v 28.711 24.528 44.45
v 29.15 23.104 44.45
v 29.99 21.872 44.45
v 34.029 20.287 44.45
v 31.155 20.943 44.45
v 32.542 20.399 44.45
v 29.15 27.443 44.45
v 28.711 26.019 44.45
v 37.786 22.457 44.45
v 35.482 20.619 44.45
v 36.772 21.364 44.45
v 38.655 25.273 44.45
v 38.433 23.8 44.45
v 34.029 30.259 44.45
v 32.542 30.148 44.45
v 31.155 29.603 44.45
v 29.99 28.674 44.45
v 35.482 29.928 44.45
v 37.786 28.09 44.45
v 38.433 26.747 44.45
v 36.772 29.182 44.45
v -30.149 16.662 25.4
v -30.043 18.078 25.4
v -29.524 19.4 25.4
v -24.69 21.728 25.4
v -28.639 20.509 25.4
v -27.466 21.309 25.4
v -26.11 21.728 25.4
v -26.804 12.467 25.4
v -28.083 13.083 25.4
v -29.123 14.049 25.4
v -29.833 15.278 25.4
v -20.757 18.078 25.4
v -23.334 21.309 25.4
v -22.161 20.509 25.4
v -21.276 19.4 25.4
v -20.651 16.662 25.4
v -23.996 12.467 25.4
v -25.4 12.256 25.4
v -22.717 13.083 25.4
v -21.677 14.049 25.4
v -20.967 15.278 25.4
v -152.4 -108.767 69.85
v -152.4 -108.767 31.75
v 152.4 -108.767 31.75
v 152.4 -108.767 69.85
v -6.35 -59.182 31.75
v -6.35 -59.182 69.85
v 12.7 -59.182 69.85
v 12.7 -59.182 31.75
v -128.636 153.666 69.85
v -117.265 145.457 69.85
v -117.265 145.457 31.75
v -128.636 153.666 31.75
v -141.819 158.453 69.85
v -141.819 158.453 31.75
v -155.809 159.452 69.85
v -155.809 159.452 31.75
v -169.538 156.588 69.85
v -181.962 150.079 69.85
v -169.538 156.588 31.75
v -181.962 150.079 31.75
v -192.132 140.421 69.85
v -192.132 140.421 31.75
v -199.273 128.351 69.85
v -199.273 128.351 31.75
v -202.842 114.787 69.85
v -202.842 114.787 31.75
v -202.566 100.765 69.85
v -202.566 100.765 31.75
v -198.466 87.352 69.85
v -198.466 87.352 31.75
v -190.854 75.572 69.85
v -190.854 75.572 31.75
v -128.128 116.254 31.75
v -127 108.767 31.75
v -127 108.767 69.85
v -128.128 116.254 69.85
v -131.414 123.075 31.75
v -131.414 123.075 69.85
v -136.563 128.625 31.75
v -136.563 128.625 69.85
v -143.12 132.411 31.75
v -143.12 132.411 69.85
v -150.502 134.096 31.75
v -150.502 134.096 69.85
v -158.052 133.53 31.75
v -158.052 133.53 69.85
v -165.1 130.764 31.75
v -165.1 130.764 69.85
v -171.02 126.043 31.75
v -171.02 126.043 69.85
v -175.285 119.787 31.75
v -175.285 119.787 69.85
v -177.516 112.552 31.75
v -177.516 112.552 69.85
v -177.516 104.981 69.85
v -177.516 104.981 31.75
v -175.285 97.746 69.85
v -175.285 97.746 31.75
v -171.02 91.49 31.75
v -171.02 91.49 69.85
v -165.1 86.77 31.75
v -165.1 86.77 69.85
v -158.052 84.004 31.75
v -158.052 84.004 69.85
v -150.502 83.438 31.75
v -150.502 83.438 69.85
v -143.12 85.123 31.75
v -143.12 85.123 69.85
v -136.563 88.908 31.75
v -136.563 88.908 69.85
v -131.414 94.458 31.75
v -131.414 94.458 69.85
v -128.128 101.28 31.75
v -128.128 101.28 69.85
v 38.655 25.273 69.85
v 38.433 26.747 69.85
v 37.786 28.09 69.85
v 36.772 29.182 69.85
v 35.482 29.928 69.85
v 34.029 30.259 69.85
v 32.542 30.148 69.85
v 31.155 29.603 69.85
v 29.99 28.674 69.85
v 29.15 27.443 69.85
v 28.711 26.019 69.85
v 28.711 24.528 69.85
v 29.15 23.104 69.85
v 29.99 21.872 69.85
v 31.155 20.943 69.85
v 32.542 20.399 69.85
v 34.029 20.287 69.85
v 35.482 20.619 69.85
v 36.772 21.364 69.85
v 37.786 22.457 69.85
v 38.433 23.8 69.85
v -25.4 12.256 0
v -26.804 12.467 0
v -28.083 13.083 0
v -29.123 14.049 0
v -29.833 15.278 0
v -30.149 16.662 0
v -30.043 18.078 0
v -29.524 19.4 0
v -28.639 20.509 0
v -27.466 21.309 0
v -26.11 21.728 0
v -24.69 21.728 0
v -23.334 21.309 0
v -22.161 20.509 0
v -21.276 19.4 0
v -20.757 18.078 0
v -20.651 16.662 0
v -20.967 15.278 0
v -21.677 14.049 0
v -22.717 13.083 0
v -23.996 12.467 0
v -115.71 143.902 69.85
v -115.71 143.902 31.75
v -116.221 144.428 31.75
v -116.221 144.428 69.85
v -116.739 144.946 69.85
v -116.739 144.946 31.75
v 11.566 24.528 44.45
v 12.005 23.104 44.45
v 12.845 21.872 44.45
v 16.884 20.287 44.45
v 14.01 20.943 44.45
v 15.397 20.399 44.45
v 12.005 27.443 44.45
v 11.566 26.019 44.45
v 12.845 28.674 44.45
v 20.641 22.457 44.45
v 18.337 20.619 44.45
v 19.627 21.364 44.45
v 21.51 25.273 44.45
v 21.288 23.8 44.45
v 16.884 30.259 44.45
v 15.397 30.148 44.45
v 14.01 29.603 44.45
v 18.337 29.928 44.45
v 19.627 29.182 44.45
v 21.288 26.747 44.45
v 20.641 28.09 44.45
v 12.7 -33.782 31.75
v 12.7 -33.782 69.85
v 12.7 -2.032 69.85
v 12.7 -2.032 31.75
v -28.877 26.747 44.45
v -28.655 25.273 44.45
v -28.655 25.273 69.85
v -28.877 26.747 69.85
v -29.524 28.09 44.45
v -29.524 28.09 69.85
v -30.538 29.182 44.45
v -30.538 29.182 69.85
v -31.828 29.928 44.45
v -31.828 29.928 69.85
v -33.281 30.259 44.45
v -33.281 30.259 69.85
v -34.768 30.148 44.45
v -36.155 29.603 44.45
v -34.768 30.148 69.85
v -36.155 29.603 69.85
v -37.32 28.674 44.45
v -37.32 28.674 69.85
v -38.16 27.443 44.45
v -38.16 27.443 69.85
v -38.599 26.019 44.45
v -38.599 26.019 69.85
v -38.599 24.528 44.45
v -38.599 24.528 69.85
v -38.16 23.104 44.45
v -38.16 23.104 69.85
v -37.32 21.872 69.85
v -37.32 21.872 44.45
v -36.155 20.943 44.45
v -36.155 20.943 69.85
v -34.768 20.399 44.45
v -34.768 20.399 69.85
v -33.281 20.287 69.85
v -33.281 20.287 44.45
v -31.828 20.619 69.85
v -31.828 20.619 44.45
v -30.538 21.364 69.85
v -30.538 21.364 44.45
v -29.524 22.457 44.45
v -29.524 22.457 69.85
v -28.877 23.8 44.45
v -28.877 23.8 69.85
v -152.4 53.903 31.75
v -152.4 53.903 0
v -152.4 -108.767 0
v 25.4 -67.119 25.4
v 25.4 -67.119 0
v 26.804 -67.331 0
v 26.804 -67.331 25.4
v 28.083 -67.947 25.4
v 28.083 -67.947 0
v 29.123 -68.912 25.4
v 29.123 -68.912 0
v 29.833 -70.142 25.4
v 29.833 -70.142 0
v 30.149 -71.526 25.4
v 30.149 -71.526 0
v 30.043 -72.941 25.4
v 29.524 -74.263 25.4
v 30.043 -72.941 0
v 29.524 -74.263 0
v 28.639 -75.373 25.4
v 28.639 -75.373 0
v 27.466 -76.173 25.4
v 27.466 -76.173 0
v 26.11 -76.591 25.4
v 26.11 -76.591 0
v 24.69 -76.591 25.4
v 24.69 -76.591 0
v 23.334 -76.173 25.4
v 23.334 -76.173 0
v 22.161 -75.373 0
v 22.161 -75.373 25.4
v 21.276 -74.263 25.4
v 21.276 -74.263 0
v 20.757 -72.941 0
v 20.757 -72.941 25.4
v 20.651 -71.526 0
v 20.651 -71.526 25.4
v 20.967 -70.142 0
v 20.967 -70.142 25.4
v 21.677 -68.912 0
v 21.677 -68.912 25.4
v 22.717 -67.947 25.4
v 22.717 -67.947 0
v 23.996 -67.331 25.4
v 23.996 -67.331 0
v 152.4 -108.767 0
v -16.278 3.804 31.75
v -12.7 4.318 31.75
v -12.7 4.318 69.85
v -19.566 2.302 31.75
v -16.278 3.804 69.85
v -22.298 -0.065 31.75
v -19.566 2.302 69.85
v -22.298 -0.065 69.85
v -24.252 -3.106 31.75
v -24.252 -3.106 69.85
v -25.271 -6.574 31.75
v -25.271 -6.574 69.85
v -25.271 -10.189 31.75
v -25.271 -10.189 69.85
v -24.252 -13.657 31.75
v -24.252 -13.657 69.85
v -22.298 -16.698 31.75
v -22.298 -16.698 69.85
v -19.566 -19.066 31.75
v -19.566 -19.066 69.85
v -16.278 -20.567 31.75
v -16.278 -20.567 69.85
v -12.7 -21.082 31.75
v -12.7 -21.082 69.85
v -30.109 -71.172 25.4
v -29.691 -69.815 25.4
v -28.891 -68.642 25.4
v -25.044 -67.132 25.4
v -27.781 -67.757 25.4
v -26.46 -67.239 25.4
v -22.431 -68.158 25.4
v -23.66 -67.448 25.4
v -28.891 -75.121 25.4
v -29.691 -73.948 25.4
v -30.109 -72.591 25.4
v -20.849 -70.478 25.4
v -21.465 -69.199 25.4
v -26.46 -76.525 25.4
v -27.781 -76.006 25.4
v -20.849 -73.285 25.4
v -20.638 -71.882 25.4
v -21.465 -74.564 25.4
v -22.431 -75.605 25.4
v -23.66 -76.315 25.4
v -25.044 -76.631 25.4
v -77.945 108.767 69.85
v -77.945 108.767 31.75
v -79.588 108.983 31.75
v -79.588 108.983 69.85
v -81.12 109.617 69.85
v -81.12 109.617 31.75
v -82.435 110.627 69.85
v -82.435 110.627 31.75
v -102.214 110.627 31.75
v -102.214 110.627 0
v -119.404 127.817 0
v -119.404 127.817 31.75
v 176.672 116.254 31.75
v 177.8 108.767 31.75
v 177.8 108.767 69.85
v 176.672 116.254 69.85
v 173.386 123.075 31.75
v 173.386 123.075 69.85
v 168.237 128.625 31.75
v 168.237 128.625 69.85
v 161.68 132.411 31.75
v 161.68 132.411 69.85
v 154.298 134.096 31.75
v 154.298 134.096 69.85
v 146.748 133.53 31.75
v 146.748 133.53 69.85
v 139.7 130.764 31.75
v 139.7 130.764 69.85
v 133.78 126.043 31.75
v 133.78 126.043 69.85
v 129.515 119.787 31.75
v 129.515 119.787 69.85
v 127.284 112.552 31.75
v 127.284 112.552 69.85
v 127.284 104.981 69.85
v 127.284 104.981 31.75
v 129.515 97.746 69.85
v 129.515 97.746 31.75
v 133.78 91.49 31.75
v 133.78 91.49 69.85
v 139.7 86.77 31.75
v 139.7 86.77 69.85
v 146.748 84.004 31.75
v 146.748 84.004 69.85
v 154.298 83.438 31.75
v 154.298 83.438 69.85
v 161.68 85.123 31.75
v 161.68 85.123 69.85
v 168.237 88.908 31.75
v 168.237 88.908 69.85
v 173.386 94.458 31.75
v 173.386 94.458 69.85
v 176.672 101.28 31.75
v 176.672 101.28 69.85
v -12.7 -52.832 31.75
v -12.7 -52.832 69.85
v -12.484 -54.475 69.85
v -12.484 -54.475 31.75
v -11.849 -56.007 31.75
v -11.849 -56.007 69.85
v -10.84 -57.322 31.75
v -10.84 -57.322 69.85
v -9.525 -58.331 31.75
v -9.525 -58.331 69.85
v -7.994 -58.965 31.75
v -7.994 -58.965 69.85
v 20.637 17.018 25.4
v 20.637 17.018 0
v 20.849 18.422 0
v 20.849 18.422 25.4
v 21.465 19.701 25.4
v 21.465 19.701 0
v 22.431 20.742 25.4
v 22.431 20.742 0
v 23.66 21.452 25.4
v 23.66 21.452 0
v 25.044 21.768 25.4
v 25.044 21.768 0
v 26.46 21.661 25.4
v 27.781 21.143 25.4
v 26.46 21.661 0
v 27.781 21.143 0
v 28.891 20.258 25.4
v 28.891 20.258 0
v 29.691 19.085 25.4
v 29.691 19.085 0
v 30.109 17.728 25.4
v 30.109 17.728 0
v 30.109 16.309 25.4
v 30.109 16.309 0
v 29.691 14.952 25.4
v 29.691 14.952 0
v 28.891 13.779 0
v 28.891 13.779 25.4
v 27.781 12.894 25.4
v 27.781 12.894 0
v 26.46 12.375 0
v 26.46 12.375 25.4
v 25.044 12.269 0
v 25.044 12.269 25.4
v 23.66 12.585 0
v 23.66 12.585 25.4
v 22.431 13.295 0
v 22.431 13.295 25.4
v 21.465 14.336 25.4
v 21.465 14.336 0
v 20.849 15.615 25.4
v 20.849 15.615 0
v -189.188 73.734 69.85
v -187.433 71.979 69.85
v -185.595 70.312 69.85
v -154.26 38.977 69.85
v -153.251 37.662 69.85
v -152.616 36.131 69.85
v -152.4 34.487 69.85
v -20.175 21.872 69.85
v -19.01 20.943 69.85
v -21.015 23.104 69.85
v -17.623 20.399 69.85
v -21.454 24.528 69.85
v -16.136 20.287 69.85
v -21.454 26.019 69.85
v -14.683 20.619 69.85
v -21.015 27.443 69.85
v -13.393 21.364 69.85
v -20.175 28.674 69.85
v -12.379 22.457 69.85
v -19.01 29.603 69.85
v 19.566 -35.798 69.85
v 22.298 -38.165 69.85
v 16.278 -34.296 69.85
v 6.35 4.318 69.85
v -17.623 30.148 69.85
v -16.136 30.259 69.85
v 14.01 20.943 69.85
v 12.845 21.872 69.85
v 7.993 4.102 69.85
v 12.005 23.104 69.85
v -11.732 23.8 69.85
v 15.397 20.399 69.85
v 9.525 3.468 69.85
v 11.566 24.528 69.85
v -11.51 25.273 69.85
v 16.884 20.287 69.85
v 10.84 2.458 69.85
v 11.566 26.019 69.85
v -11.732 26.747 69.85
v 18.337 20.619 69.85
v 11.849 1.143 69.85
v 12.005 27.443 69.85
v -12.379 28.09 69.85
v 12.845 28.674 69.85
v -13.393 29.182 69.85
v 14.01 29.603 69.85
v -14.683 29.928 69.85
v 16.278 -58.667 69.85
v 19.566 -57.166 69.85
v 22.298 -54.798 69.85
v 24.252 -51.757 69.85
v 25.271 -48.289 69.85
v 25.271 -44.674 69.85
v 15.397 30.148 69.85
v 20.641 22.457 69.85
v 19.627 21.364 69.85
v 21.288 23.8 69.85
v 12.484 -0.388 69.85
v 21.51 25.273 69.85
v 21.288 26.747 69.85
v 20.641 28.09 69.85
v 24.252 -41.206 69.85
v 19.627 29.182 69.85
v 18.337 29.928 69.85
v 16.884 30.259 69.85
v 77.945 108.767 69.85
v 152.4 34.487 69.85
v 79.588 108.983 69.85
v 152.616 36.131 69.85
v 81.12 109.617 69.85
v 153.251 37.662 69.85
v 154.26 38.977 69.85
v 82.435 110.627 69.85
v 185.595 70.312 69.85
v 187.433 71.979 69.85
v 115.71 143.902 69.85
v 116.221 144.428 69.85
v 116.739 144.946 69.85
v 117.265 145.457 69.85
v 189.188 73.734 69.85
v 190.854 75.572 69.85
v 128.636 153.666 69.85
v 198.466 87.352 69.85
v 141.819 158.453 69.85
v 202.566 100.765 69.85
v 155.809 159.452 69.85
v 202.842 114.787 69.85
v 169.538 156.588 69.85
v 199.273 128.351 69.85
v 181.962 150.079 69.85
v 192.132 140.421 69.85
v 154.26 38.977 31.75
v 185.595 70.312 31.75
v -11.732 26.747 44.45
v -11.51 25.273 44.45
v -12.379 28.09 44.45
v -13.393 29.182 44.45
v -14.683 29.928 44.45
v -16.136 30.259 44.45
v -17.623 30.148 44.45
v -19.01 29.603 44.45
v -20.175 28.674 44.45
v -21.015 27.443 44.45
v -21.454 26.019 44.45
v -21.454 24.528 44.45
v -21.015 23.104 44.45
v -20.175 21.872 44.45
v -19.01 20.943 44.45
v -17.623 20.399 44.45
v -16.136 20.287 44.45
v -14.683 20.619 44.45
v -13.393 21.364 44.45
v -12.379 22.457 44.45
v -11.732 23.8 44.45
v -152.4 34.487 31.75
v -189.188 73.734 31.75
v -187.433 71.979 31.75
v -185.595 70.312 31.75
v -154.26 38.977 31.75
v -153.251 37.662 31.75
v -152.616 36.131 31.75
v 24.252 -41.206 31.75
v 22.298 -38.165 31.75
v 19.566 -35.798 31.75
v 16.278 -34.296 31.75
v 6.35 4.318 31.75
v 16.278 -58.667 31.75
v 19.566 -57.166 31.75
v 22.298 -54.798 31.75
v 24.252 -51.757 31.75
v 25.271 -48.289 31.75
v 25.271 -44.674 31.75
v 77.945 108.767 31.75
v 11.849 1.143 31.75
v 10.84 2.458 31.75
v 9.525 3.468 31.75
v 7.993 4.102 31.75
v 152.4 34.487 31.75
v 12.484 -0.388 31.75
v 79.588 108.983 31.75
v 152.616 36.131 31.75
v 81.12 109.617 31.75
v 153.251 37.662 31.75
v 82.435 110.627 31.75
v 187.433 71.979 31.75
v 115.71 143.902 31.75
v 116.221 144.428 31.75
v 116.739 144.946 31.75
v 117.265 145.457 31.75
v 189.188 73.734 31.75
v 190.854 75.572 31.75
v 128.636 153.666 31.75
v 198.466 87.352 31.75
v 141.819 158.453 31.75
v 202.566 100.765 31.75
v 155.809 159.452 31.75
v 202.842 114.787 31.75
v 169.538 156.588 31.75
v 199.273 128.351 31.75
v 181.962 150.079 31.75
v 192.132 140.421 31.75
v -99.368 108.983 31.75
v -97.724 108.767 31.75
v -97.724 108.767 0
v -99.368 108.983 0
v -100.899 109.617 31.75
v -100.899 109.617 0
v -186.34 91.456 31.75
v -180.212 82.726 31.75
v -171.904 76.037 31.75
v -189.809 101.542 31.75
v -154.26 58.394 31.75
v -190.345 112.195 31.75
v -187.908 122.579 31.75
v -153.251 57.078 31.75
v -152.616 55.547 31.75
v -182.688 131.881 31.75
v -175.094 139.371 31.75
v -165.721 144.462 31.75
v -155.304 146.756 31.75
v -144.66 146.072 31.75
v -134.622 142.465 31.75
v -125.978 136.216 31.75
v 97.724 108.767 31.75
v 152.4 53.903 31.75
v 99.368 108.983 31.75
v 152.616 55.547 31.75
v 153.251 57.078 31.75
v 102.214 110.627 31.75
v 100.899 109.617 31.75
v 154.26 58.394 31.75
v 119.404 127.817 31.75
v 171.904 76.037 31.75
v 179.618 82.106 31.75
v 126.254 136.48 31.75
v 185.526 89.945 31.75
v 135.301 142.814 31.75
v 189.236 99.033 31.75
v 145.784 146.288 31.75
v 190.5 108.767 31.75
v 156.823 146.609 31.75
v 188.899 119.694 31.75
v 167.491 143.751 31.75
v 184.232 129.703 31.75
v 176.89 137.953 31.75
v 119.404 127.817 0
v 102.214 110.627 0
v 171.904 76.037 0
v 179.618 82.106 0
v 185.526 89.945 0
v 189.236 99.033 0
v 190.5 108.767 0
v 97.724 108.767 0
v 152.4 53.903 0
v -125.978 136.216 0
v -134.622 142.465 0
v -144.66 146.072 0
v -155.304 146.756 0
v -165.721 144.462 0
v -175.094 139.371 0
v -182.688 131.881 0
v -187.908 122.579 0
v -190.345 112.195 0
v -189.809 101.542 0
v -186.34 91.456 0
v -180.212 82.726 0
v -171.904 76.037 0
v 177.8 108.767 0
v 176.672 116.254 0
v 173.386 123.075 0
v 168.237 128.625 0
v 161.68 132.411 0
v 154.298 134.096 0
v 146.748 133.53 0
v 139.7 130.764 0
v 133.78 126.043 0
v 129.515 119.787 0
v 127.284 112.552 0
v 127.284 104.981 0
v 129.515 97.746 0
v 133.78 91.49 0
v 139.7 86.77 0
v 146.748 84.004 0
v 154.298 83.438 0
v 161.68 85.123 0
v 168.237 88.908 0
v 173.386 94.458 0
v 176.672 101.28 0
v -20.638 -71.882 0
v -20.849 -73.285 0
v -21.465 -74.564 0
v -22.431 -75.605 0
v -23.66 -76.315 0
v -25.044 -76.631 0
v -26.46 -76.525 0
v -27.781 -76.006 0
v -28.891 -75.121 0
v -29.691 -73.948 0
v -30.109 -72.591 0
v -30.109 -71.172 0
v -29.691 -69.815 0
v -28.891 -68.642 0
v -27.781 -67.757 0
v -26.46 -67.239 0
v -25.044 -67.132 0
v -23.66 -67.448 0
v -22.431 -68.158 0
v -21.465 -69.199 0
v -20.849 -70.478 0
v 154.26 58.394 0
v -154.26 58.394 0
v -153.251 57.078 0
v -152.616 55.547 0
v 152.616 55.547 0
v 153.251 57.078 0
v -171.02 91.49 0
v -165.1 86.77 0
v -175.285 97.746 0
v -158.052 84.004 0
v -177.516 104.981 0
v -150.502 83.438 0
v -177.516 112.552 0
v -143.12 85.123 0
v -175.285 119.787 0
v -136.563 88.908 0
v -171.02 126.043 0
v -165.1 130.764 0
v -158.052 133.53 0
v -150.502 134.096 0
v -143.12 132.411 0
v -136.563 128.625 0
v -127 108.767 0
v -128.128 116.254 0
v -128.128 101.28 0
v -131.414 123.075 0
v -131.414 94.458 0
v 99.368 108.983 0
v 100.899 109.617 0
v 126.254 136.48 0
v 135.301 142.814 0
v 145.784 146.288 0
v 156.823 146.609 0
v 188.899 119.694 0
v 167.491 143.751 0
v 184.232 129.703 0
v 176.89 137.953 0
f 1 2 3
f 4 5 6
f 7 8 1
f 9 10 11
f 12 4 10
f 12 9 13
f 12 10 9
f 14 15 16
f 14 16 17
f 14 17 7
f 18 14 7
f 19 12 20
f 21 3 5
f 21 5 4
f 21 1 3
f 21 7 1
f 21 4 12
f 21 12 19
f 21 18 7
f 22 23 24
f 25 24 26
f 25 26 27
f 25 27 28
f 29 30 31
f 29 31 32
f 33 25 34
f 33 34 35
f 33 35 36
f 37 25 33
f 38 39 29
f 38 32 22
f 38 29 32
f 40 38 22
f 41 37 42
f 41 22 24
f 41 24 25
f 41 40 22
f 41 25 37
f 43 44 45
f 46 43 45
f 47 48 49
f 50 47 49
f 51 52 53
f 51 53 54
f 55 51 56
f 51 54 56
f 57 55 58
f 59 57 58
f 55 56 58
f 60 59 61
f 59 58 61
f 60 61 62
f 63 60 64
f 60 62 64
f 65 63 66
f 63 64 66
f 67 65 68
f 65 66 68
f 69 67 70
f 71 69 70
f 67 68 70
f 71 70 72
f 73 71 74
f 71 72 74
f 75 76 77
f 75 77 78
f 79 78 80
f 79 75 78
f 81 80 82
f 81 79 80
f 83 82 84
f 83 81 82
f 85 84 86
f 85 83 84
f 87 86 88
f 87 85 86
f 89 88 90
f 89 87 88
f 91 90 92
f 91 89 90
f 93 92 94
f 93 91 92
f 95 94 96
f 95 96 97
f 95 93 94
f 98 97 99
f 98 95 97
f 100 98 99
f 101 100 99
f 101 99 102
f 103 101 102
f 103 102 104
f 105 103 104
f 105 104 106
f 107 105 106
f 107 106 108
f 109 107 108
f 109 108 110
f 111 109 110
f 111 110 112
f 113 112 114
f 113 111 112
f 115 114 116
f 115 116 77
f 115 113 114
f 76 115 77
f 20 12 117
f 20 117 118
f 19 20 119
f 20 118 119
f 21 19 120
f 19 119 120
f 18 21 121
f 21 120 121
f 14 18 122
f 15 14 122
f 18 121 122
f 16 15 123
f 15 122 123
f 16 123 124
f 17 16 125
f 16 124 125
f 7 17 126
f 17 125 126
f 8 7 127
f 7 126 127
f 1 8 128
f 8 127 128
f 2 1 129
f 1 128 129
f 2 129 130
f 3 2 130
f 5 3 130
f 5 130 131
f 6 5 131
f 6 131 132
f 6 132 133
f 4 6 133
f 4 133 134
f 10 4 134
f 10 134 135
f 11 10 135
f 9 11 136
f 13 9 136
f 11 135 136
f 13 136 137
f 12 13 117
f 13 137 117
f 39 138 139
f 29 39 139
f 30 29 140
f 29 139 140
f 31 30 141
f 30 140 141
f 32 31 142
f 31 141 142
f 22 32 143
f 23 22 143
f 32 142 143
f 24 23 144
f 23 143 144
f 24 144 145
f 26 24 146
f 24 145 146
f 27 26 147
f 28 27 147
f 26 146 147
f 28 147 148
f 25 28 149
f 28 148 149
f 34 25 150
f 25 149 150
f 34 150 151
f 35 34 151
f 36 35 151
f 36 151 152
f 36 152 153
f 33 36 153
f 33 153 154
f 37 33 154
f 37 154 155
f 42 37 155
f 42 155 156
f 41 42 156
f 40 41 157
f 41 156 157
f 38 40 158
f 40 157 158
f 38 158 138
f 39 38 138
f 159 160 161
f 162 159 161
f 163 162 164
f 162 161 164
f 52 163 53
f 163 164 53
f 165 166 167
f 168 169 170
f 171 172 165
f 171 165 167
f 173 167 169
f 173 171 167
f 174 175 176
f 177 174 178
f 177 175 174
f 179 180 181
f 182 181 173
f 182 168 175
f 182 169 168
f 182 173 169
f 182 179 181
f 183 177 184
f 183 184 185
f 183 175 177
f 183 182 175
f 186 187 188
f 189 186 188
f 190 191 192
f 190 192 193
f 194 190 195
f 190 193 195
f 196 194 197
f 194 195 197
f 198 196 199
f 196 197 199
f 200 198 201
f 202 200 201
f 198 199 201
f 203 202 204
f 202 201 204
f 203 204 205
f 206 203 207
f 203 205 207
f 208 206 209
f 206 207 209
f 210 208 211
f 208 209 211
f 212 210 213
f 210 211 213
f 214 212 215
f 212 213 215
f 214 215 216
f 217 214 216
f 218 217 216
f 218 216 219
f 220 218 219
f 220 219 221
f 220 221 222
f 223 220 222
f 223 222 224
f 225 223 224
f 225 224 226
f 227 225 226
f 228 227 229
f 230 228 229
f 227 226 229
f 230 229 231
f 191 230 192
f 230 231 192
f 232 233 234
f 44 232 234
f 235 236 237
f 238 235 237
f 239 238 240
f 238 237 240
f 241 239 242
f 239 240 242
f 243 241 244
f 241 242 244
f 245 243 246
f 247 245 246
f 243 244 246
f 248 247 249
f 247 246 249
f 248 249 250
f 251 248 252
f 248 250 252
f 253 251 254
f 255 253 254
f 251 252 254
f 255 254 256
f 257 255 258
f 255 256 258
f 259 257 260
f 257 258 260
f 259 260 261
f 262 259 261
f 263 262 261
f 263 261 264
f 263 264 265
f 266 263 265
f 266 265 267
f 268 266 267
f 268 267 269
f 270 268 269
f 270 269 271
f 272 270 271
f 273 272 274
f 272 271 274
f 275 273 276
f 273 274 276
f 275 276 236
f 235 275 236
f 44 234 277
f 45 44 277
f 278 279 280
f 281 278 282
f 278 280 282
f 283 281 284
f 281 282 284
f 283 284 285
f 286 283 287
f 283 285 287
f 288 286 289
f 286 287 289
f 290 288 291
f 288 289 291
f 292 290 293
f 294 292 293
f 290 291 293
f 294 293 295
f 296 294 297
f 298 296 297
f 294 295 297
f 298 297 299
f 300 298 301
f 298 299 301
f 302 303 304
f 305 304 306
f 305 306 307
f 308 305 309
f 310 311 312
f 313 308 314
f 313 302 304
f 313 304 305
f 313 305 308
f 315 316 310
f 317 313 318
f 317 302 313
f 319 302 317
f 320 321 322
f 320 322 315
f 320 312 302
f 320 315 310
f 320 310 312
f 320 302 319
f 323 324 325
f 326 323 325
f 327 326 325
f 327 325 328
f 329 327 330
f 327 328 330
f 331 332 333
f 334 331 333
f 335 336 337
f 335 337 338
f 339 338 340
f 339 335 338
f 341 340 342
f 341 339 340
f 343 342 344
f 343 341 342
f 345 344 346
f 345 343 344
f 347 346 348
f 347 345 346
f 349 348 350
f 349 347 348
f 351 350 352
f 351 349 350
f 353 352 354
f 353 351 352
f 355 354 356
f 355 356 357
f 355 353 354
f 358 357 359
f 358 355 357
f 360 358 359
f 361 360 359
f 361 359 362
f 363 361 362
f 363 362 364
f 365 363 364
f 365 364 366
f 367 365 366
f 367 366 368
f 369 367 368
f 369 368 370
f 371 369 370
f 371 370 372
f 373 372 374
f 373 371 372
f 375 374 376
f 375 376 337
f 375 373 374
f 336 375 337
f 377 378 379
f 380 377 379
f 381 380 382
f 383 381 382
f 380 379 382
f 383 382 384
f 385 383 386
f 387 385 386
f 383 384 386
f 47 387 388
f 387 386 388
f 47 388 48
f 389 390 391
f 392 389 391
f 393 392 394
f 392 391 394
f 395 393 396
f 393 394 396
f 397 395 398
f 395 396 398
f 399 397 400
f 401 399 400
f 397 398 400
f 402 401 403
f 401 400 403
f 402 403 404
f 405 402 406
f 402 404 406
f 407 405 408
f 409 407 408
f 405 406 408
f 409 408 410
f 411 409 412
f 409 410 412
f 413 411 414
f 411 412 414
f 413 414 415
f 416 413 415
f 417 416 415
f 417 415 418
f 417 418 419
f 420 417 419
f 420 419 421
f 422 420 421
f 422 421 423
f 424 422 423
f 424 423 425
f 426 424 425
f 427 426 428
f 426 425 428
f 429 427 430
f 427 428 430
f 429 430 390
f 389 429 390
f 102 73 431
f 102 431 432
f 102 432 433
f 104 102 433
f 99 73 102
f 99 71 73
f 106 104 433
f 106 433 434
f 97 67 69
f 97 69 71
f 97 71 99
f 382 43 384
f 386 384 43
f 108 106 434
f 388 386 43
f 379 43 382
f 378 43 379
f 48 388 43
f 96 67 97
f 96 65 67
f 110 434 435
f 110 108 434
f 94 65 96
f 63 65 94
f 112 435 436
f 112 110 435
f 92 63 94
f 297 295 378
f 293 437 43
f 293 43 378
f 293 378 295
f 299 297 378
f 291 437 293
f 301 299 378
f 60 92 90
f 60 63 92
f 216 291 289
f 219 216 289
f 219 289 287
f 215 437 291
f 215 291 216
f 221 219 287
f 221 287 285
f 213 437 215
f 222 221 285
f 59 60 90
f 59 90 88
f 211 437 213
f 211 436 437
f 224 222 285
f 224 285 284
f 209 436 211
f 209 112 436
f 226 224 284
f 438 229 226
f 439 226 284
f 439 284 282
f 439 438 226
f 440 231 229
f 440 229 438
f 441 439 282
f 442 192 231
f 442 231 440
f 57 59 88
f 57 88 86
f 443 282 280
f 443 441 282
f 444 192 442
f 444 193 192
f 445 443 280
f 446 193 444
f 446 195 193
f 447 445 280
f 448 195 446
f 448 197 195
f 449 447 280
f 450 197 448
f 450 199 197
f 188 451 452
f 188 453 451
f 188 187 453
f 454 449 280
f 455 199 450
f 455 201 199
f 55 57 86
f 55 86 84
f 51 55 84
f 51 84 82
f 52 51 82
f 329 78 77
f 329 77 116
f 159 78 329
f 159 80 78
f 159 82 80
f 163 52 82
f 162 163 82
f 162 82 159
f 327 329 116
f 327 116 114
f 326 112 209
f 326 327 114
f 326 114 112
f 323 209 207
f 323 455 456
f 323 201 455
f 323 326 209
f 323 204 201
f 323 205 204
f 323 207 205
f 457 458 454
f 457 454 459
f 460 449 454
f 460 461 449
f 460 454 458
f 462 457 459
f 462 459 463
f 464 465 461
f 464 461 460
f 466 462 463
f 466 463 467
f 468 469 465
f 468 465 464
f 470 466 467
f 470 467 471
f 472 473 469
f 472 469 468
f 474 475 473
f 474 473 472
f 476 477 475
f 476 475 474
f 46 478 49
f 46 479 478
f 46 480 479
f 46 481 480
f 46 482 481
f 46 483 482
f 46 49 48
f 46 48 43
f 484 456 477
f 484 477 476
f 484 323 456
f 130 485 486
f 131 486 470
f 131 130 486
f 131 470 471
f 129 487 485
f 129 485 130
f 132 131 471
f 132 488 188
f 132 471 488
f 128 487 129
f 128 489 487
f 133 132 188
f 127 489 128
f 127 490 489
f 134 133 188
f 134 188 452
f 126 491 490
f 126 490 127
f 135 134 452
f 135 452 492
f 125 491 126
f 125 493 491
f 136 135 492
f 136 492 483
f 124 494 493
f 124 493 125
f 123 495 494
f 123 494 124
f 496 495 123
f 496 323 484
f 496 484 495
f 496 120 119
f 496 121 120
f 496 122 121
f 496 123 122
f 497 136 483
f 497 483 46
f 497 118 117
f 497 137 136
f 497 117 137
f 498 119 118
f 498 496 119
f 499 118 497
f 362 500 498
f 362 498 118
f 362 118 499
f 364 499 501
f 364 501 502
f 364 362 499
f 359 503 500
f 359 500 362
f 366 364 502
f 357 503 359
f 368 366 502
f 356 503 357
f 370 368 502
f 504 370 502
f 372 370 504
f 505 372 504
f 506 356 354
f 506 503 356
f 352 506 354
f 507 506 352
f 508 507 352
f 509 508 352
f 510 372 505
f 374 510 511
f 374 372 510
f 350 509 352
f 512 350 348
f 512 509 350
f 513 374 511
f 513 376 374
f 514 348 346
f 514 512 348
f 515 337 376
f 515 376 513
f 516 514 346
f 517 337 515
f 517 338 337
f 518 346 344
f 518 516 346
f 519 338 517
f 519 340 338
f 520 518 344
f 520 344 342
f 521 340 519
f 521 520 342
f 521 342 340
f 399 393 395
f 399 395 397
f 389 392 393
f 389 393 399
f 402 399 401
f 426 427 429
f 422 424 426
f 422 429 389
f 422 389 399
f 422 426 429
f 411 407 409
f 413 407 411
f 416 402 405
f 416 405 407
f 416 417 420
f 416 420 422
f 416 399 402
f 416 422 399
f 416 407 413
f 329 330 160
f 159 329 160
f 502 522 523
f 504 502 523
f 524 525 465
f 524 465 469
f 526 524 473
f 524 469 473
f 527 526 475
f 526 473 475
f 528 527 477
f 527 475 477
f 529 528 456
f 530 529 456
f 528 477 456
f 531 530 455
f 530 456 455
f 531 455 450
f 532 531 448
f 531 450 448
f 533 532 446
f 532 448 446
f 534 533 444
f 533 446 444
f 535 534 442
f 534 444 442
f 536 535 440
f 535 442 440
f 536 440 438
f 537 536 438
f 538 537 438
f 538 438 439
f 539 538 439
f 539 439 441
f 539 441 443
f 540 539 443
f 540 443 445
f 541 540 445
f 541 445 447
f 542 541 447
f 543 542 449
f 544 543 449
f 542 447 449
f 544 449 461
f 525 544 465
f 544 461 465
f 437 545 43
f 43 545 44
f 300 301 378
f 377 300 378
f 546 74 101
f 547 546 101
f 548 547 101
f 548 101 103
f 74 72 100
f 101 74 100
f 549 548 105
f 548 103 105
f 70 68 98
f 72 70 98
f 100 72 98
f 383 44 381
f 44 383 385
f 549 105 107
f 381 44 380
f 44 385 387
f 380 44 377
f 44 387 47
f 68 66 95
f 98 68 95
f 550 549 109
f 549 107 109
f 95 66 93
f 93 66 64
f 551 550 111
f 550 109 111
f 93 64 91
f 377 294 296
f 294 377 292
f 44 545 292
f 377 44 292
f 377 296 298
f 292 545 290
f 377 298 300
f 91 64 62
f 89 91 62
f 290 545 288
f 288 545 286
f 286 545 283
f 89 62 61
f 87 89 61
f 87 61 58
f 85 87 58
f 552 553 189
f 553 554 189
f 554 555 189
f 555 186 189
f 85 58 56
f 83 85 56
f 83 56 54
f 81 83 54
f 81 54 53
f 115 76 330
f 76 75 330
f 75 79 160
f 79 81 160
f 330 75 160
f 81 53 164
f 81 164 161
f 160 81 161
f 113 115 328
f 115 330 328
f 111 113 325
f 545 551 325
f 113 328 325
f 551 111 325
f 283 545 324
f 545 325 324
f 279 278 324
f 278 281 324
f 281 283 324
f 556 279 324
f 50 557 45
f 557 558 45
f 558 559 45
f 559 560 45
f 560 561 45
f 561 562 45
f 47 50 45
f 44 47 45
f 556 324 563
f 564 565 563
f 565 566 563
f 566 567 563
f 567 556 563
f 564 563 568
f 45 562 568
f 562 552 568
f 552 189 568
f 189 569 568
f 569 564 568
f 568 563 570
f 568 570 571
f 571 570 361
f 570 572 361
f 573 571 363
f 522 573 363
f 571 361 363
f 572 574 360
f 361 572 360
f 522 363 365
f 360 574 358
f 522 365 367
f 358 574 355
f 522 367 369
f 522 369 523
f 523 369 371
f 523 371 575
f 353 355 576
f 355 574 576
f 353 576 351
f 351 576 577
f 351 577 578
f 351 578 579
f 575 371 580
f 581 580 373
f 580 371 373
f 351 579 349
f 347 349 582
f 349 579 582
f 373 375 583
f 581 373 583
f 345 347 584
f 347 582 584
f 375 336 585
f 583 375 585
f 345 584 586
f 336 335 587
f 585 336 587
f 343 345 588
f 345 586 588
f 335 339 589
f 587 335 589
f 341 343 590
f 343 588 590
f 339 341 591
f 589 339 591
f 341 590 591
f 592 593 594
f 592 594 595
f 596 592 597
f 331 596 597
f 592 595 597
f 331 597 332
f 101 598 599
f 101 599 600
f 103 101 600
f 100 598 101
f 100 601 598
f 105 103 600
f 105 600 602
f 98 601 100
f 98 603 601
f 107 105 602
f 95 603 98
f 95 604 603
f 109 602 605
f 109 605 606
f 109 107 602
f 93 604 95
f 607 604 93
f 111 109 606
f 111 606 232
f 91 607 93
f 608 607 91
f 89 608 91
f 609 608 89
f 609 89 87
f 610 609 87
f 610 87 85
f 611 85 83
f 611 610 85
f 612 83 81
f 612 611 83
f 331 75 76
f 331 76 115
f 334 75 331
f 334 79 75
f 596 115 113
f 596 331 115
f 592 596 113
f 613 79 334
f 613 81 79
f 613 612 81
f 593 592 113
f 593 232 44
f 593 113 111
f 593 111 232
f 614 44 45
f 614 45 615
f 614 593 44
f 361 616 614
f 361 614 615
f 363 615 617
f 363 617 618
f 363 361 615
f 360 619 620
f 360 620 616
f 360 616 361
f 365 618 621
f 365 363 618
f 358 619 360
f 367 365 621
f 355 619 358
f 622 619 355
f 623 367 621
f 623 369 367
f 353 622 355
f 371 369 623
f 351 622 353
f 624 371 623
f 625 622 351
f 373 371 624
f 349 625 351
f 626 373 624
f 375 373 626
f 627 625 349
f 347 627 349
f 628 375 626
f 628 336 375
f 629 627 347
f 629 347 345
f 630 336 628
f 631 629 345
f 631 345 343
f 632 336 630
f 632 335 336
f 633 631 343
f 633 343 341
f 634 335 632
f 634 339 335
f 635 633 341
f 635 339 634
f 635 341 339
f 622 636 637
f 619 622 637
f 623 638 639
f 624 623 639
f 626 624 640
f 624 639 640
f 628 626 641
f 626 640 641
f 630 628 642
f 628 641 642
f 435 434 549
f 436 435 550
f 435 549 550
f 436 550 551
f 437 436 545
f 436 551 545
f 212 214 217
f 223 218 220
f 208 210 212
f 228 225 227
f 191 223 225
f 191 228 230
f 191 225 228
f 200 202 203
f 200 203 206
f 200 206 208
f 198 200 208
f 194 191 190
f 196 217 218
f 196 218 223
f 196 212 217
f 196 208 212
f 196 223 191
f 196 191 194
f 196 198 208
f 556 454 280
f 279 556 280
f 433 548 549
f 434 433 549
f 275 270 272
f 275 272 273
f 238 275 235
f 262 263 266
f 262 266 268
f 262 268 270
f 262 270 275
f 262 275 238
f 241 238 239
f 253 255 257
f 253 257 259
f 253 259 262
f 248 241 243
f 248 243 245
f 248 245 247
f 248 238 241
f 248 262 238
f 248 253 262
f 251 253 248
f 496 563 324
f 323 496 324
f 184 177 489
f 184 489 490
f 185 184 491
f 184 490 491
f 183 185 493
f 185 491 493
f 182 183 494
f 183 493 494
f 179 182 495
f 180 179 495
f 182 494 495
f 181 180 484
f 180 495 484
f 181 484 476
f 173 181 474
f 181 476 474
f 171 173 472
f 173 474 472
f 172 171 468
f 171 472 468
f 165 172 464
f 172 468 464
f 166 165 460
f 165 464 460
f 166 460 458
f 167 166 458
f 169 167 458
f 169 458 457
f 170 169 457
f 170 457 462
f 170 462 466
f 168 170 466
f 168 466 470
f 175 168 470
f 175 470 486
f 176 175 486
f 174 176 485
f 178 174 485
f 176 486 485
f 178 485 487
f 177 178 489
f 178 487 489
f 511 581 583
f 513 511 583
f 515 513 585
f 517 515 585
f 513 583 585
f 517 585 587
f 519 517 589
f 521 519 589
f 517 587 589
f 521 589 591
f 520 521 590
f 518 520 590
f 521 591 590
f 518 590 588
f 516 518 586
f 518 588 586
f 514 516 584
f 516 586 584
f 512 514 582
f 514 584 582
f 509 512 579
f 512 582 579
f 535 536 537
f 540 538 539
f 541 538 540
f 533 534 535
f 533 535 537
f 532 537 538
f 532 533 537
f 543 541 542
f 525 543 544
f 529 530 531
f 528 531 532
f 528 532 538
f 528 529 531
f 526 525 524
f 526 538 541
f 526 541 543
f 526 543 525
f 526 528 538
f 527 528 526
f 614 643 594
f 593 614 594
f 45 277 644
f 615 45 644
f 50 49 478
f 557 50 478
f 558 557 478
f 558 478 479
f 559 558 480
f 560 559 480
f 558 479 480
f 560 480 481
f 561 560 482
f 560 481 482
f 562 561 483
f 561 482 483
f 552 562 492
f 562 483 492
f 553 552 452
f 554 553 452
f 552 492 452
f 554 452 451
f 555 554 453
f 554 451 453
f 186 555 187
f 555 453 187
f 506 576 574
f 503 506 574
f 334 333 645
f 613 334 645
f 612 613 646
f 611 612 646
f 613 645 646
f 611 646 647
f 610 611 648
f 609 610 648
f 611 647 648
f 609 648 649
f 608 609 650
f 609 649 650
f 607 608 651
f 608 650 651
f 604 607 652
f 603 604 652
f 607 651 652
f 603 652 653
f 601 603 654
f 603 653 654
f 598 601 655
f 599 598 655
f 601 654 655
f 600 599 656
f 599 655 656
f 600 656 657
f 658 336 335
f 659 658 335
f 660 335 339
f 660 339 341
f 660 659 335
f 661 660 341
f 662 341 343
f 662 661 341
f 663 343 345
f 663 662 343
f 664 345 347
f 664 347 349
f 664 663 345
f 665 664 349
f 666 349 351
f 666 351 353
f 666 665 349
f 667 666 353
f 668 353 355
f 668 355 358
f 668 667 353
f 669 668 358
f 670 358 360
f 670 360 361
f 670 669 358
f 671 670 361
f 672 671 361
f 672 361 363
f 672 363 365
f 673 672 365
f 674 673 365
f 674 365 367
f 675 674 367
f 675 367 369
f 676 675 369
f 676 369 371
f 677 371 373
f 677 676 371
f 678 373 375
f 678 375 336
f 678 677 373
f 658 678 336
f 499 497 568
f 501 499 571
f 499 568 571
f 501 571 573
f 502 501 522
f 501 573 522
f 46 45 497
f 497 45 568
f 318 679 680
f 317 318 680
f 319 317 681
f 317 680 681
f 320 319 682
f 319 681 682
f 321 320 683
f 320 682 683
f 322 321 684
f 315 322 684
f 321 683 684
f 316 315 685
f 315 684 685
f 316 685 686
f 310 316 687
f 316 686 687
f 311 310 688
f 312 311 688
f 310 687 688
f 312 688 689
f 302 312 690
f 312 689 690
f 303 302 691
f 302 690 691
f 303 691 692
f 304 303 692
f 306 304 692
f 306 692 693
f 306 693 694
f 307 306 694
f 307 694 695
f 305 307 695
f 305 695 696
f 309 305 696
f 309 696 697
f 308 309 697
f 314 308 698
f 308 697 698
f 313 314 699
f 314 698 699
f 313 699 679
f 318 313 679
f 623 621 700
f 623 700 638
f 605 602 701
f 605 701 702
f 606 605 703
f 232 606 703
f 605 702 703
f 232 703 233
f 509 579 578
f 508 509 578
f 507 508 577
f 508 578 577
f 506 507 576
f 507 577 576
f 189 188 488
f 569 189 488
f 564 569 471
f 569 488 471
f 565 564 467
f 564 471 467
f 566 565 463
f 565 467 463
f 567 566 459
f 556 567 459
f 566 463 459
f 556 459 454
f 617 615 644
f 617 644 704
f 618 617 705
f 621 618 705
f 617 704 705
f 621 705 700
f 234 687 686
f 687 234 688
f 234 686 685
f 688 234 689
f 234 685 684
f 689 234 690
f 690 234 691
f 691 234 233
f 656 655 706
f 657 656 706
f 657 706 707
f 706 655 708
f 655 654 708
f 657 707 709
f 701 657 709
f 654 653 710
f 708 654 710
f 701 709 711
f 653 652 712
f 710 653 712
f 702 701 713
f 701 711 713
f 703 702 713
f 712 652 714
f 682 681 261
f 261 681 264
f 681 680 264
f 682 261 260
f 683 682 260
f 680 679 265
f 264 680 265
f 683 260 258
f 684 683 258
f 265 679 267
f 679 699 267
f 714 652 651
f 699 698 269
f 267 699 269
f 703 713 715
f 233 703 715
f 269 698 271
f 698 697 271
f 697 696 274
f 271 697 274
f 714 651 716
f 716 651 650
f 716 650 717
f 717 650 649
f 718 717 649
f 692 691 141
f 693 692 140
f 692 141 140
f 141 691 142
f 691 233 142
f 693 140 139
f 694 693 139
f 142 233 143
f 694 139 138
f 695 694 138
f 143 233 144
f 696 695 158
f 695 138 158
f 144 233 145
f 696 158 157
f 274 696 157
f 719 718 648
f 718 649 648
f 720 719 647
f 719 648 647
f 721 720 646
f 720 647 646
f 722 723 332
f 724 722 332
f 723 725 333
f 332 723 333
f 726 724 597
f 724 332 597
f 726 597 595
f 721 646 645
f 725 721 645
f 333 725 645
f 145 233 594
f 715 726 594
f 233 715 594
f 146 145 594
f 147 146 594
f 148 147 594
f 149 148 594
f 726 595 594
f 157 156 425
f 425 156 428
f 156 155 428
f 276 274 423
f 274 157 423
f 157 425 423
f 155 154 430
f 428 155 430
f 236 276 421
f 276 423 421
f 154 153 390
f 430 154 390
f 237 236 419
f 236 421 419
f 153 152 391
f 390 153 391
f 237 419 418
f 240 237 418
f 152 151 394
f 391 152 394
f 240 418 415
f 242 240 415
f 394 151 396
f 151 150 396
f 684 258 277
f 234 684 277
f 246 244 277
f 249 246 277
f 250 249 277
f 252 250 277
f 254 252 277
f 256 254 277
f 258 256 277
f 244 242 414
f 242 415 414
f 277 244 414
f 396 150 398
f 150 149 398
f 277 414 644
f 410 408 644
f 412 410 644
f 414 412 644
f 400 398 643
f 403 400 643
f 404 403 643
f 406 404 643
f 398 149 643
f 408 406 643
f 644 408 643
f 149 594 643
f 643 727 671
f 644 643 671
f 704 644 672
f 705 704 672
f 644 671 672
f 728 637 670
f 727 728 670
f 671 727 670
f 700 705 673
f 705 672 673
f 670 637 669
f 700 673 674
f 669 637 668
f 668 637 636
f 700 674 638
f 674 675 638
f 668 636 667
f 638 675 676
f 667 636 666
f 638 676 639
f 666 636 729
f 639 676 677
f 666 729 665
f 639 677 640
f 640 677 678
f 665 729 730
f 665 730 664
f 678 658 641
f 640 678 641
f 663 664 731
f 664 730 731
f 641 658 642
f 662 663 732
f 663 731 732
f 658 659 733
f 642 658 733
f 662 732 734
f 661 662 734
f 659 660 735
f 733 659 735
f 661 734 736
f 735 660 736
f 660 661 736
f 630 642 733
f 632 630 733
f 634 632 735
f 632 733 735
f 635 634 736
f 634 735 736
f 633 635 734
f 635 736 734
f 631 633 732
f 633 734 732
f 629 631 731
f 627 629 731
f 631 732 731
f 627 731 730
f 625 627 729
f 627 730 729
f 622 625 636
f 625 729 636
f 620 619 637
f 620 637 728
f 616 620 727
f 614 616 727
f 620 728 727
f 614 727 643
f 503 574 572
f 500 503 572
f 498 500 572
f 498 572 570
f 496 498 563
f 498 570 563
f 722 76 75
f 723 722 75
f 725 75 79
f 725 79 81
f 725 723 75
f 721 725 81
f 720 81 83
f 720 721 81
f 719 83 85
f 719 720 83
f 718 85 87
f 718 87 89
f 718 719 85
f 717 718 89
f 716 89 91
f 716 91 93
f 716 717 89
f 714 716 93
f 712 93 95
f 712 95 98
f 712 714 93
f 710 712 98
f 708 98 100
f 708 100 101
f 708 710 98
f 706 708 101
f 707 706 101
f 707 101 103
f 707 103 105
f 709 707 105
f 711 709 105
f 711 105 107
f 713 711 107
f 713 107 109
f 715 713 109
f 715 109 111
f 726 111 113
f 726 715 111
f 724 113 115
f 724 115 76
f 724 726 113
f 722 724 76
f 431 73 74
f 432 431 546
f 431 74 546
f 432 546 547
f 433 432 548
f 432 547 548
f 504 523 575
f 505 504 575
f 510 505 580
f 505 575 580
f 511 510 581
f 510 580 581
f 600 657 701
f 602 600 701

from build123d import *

# Parameters (mm, degrees)
F0_R      = 25.4
F1_DEPTH  = 31.75
F4_R      = 25.4
F5_DEPTH  = 38.1
F7_DEPTH  = 25.4
F9_R      = 5
F10_DEPTH = 25.4
F12_DEPTH = 38.1


with BuildPart() as f1:
    # F0 (on Top) → F1 (new body)
    with BuildSketch(Plane.XY):
        with BuildLine():
            Line((-152.4, 53.9033839703), (-152.4, -108.7667216295))
            Line((-152.4, -108.7667216295), (152.4, -108.7667216295))
            Line((152.4, -108.7667216295), (152.4, 53.9033839703))
            ThreePointArc((152.4, 53.9033839703), (152.8833649686, 56.3334237658), (154.2598719395, 58.3935120309))
            Line((154.2598719395, 58.3935120309), (171.9035763614, 76.0372164528))
            ThreePointArc((171.9035763614, 76.0372164528), (125.6457900901, 81.6406778321), (119.4044321158, 127.8167216295))
            Line((119.4044321158, 127.8167216295), (102.2143040553, 110.626593569))
            ThreePointArc((102.2143040553, 110.626593569), (100.1542157903, 109.2500865981), (97.7241759947, 108.7667216295))
            Line((97.7241759947, 108.7667216295), (-97.7241759947, 108.7667216295))
            ThreePointArc((-97.7241759947, 108.7667216295), (-100.1542157903, 109.2500865981), (-102.2143040553, 110.626593569))
            Line((-102.2143040553, 110.626593569), (-119.4044321158, 127.8167216295))
            ThreePointArc((-119.4044321158, 127.8167216295), (-115.5982260184, 118.6277272479), (-114.3, 108.7667216295))
            ThreePointArc((-114.3, 108.7667216295), (-125.4592316368, 81.8259532663), (-152.4, 70.6667216295))
            Line((-152.4, 70.6667216295), (-152.4, 53.9033839703))
        make_face()
        with BuildLine():
            ThreePointArc((-171.9035763614, 76.0372164528), (-162.5147380778, 72.0338742907), (-152.4, 70.6667216295))
            ThreePointArc((-152.4, 70.6667216295), (-125.4592316368, 81.8259532663), (-114.3, 108.7667216295))
            ThreePointArc((-114.3, 108.7667216295), (-115.5982260184, 118.6277272479), (-119.4044321158, 127.8167216295))
            ThreePointArc((-119.4044321158, 127.8167216295), (-179.1542099099, 135.8927654269), (-171.9035763614, 76.0372164528))
        make_face()
        with Locations((-152.4, 108.7667216295)):
            Circle(F0_R, mode=Mode.SUBTRACT)
        with BuildLine():
            ThreePointArc((119.4044321158, 127.8167216295), (125.6457900901, 81.6406778321), (171.9035763614, 76.0372164528))
            ThreePointArc((171.9035763614, 76.0372164528), (185.5262453303, 89.9448760687), (190.5, 108.7667216295))
            ThreePointArc((190.5, 108.7667216295), (162.2610056184, 145.5684956111), (119.4044321158, 127.8167216295))
        make_face()
        with Locations((152.4, 108.7667216295)):
            Circle(F0_R, mode=Mode.SUBTRACT)
        with BuildLine():
            ThreePointArc((-154.2598719395, 58.3935120309), (-152.8833649686, 56.3334237658), (-152.4, 53.9033839703))
            Line((-152.4, 53.9033839703), (-152.4, 70.6667216295))
            ThreePointArc((-152.4, 70.6667216295), (-162.5147380778, 72.0338742907), (-171.9035763614, 76.0372164528))
            Line((-171.9035763614, 76.0372164528), (-154.2598719395, 58.3935120309))
        make_face()
    extrude(amount=F1_DEPTH)


with BuildPart() as f2_1:
    # F2: copy of F1
    add(f1.part)


with BuildPart() as f5:
    # F4 (on face) → F5 (new body)
    with BuildSketch(Plane.XY.offset(31.75)):
        with BuildLine():
            Line((-152.4, -108.7667216295), (152.4, -108.7667216295))
            Line((152.4, -108.7667216295), (152.4, 34.487204177))
            ThreePointArc((152.4, 34.487204177), (152.8833649686, 36.9172439725), (154.2598719395, 38.9773322375))
            Line((154.2598719395, 38.9773322375), (185.5948326386, 70.3122929367))
            Line((185.5948326386, 70.3122929367), (190.8544286929, 75.5718889909))
            ThreePointArc((190.8544286929, 75.5718889909), (187.3817017696, 145.6031240231), (117.2645696221, 145.4565231029))
            Line((117.2645696221, 145.4565231029), (115.7101985266, 143.9021520075))
            Line((115.7101985266, 143.9021520075), (82.4346400881, 110.626593569))
            ThreePointArc((82.4346400881, 110.626593569), (80.3745518231, 109.2500865981), (77.9445120276, 108.7667216295))
            Line((77.9445120276, 108.7667216295), (-77.9445120276, 108.7667216295))
            ThreePointArc((-77.9445120276, 108.7667216295), (-80.3745518231, 109.2500865981), (-82.4346400881, 110.626593569))
            Line((-82.4346400881, 110.626593569), (-115.7101985266, 143.9021520075))
            Line((-115.7101985266, 143.9021520075), (-117.2645696221, 145.4565231029))
            ThreePointArc((-117.2645696221, 145.4565231029), (-187.3817017696, 145.6031240231), (-190.8544286929, 75.5718889909))
            Line((-190.8544286929, 75.5718889909), (-185.5948326386, 70.3122929367))
            Line((-185.5948326386, 70.3122929367), (-154.2598719395, 38.9773322375))
            ThreePointArc((-154.2598719395, 38.9773322375), (-152.8833649686, 36.9172439725), (-152.4, 34.487204177))
            Line((-152.4, 34.487204177), (-152.4, -108.7667216295))
        make_face()
        with Locations((-152.4, 108.7667216295)):
            Circle(F4_R, mode=Mode.SUBTRACT)
        with Locations((152.4, 108.7667216295)):
            Circle(F4_R, mode=Mode.SUBTRACT)
        with BuildLine():
            Line((190.8544286929, 75.5718889909), (185.5948326386, 70.3122929367))
            ThreePointArc((185.5948326386, 70.3122929367), (188.3210244843, 72.8456971453), (190.8544286929, 75.5718889909))
        make_face()
        with BuildLine():
            ThreePointArc((-190.8544286929, 75.5718889909), (-188.3210244843, 72.8456971453), (-185.5948326386, 70.3122929367))
            Line((-185.5948326386, 70.3122929367), (-190.8544286929, 75.5718889909))
        make_face()
        with BuildLine():
            Line((115.7101985266, 143.9021520075), (117.2645696221, 145.4565231029))
            ThreePointArc((117.2645696221, 145.4565231029), (116.4789755157, 144.6877461138), (115.7101985266, 143.9021520075))
        make_face()
        with BuildLine():
            ThreePointArc((-115.7101985266, 143.9021520075), (-116.4789755157, 144.6877461138), (-117.2645696221, 145.4565231029))
            Line((-117.2645696221, 145.4565231029), (-115.7101985266, 143.9021520075))
        make_face()
    extrude(amount=F5_DEPTH)

    # F9 (on face) → F10 (cut)
    with BuildSketch(Plane.XY.offset(69.85)):
        with Locations((-33.655, 25.2733201705)):
            Circle(F9_R)
        with Locations((-16.51, 25.2733201705)):
            Circle(F9_R)
        with Locations((16.51, 25.2733201705)):
            Circle(F9_R)
        with Locations((33.655, 25.2733201705)):
            Circle(F9_R)
    extrude(amount=-F10_DEPTH, mode=Mode.SUBTRACT)

    # F11 (on face) → F12 (cut, through all)
    with BuildSketch(Plane.XY.offset(69.85)):
        with BuildLine():
            ThreePointArc((12.6999875243, -59.1816798295), (25.3999875243, -46.4816798295), (12.6999875243, -33.7816798295))
            Line((12.6999875243, -33.7816798295), (12.6999875243, -2.0316798295))
            ThreePointArc((12.6999875243, -2.0316798295), (10.8401155849, 2.458448231), (6.3499875243, 4.3183201705))
            Line((6.3499875243, 4.3183201705), (-12.7000124757, 4.3183201705))
            ThreePointArc((-12.7000124757, 4.3183201705), (-25.4000124757, -8.3816798295), (-12.7000124757, -21.0816798295))
            Line((-12.7000124757, -21.0816798295), (-12.7000124757, -52.8316798295))
            ThreePointArc((-12.7000124757, -52.8316798295), (-10.8401405362, -57.3218078901), (-6.3500124757, -59.1816798295))
            Line((-6.3500124757, -59.1816798295), (12.6999875243, -59.1816798295))
        make_face()
    extrude(amount=-F12_DEPTH, mode=Mode.SUBTRACT)


with BuildPart() as f1_1:
    add(f1.part)

    # F6 (on face) → F7 (cut)
    with BuildSketch(Plane(origin=(0, 0, 0), x_dir=(1, 0, 0), z_dir=(0, 0, -1))):
        with BuildLine():
            Line((-25.4, 71.8816688296), (-25.4, 67.1191688296))
            ThreePointArc((-25.4, 67.1191688296), (-22.0324039546, 68.5140727842), (-20.6375, 71.8816688296))
            Line((-20.6375, 71.8816688296), (-25.4, 71.8816688296))
        make_face()
        with BuildLine():
            ThreePointArc((-20.6375, 71.8816688296), (-28.7675960454, 75.249264875), (-25.4, 67.1191688296))
            Line((-25.4, 67.1191688296), (-25.4, 71.8816688296))
            Line((-25.4, 71.8816688296), (-20.6375, 71.8816688296))
        make_face()
        with BuildLine():
            Line((25.4, 71.8816688296), (25.4, 67.1191688296))
            ThreePointArc((25.4, 67.1191688296), (28.7675960454, 68.5140727842), (30.1625, 71.8816688296))
            ThreePointArc((30.1625, 71.8816688296), (25.4, 76.6441688296), (20.6375, 71.8816688296))
            Line((20.6375, 71.8816688296), (25.4, 71.8816688296))
        make_face()
        with BuildLine():
            ThreePointArc((20.6375, 71.8816688296), (22.0324039546, 68.5140727842), (25.4, 67.1191688296))
            Line((25.4, 67.1191688296), (25.4, 71.8816688296))
            Line((25.4, 71.8816688296), (20.6375, 71.8816688296))
        make_face()
        with BuildLine():
            ThreePointArc((-20.6375, -17.0183311704), (-22.0324039546, -13.650735125), (-25.4, -12.2558311704))
            Line((-25.4, -12.2558311704), (-25.4, -17.0183311704))
            Line((-25.4, -17.0183311704), (-20.6375, -17.0183311704))
        make_face()
        with BuildLine():
            Line((-25.4, -17.0183311704), (-25.4, -12.2558311704))
            ThreePointArc((-25.4, -12.2558311704), (-28.7675960454, -20.3859272158), (-20.6375, -17.0183311704))
            Line((-20.6375, -17.0183311704), (-25.4, -17.0183311704))
        make_face()
        with BuildLine():
            Line((25.4, -17.0183311704), (25.4, -12.2558311704))
            ThreePointArc((25.4, -12.2558311704), (22.0324039546, -13.650735125), (20.6375, -17.0183311704))
            Line((20.6375, -17.0183311704), (25.4, -17.0183311704))
        make_face()
        with BuildLine():
            ThreePointArc((30.1625, -17.0183311704), (28.7675960454, -13.650735125), (25.4, -12.2558311704))
            Line((25.4, -12.2558311704), (25.4, -17.0183311704))
            Line((25.4, -17.0183311704), (20.6375, -17.0183311704))
            ThreePointArc((20.6375, -17.0183311704), (25.4, -21.7808311704), (30.1625, -17.0183311704))
        make_face()
    extrude(amount=-F7_DEPTH, mode=Mode.SUBTRACT)


solid = Compound([f5.part, f1_1.part])
